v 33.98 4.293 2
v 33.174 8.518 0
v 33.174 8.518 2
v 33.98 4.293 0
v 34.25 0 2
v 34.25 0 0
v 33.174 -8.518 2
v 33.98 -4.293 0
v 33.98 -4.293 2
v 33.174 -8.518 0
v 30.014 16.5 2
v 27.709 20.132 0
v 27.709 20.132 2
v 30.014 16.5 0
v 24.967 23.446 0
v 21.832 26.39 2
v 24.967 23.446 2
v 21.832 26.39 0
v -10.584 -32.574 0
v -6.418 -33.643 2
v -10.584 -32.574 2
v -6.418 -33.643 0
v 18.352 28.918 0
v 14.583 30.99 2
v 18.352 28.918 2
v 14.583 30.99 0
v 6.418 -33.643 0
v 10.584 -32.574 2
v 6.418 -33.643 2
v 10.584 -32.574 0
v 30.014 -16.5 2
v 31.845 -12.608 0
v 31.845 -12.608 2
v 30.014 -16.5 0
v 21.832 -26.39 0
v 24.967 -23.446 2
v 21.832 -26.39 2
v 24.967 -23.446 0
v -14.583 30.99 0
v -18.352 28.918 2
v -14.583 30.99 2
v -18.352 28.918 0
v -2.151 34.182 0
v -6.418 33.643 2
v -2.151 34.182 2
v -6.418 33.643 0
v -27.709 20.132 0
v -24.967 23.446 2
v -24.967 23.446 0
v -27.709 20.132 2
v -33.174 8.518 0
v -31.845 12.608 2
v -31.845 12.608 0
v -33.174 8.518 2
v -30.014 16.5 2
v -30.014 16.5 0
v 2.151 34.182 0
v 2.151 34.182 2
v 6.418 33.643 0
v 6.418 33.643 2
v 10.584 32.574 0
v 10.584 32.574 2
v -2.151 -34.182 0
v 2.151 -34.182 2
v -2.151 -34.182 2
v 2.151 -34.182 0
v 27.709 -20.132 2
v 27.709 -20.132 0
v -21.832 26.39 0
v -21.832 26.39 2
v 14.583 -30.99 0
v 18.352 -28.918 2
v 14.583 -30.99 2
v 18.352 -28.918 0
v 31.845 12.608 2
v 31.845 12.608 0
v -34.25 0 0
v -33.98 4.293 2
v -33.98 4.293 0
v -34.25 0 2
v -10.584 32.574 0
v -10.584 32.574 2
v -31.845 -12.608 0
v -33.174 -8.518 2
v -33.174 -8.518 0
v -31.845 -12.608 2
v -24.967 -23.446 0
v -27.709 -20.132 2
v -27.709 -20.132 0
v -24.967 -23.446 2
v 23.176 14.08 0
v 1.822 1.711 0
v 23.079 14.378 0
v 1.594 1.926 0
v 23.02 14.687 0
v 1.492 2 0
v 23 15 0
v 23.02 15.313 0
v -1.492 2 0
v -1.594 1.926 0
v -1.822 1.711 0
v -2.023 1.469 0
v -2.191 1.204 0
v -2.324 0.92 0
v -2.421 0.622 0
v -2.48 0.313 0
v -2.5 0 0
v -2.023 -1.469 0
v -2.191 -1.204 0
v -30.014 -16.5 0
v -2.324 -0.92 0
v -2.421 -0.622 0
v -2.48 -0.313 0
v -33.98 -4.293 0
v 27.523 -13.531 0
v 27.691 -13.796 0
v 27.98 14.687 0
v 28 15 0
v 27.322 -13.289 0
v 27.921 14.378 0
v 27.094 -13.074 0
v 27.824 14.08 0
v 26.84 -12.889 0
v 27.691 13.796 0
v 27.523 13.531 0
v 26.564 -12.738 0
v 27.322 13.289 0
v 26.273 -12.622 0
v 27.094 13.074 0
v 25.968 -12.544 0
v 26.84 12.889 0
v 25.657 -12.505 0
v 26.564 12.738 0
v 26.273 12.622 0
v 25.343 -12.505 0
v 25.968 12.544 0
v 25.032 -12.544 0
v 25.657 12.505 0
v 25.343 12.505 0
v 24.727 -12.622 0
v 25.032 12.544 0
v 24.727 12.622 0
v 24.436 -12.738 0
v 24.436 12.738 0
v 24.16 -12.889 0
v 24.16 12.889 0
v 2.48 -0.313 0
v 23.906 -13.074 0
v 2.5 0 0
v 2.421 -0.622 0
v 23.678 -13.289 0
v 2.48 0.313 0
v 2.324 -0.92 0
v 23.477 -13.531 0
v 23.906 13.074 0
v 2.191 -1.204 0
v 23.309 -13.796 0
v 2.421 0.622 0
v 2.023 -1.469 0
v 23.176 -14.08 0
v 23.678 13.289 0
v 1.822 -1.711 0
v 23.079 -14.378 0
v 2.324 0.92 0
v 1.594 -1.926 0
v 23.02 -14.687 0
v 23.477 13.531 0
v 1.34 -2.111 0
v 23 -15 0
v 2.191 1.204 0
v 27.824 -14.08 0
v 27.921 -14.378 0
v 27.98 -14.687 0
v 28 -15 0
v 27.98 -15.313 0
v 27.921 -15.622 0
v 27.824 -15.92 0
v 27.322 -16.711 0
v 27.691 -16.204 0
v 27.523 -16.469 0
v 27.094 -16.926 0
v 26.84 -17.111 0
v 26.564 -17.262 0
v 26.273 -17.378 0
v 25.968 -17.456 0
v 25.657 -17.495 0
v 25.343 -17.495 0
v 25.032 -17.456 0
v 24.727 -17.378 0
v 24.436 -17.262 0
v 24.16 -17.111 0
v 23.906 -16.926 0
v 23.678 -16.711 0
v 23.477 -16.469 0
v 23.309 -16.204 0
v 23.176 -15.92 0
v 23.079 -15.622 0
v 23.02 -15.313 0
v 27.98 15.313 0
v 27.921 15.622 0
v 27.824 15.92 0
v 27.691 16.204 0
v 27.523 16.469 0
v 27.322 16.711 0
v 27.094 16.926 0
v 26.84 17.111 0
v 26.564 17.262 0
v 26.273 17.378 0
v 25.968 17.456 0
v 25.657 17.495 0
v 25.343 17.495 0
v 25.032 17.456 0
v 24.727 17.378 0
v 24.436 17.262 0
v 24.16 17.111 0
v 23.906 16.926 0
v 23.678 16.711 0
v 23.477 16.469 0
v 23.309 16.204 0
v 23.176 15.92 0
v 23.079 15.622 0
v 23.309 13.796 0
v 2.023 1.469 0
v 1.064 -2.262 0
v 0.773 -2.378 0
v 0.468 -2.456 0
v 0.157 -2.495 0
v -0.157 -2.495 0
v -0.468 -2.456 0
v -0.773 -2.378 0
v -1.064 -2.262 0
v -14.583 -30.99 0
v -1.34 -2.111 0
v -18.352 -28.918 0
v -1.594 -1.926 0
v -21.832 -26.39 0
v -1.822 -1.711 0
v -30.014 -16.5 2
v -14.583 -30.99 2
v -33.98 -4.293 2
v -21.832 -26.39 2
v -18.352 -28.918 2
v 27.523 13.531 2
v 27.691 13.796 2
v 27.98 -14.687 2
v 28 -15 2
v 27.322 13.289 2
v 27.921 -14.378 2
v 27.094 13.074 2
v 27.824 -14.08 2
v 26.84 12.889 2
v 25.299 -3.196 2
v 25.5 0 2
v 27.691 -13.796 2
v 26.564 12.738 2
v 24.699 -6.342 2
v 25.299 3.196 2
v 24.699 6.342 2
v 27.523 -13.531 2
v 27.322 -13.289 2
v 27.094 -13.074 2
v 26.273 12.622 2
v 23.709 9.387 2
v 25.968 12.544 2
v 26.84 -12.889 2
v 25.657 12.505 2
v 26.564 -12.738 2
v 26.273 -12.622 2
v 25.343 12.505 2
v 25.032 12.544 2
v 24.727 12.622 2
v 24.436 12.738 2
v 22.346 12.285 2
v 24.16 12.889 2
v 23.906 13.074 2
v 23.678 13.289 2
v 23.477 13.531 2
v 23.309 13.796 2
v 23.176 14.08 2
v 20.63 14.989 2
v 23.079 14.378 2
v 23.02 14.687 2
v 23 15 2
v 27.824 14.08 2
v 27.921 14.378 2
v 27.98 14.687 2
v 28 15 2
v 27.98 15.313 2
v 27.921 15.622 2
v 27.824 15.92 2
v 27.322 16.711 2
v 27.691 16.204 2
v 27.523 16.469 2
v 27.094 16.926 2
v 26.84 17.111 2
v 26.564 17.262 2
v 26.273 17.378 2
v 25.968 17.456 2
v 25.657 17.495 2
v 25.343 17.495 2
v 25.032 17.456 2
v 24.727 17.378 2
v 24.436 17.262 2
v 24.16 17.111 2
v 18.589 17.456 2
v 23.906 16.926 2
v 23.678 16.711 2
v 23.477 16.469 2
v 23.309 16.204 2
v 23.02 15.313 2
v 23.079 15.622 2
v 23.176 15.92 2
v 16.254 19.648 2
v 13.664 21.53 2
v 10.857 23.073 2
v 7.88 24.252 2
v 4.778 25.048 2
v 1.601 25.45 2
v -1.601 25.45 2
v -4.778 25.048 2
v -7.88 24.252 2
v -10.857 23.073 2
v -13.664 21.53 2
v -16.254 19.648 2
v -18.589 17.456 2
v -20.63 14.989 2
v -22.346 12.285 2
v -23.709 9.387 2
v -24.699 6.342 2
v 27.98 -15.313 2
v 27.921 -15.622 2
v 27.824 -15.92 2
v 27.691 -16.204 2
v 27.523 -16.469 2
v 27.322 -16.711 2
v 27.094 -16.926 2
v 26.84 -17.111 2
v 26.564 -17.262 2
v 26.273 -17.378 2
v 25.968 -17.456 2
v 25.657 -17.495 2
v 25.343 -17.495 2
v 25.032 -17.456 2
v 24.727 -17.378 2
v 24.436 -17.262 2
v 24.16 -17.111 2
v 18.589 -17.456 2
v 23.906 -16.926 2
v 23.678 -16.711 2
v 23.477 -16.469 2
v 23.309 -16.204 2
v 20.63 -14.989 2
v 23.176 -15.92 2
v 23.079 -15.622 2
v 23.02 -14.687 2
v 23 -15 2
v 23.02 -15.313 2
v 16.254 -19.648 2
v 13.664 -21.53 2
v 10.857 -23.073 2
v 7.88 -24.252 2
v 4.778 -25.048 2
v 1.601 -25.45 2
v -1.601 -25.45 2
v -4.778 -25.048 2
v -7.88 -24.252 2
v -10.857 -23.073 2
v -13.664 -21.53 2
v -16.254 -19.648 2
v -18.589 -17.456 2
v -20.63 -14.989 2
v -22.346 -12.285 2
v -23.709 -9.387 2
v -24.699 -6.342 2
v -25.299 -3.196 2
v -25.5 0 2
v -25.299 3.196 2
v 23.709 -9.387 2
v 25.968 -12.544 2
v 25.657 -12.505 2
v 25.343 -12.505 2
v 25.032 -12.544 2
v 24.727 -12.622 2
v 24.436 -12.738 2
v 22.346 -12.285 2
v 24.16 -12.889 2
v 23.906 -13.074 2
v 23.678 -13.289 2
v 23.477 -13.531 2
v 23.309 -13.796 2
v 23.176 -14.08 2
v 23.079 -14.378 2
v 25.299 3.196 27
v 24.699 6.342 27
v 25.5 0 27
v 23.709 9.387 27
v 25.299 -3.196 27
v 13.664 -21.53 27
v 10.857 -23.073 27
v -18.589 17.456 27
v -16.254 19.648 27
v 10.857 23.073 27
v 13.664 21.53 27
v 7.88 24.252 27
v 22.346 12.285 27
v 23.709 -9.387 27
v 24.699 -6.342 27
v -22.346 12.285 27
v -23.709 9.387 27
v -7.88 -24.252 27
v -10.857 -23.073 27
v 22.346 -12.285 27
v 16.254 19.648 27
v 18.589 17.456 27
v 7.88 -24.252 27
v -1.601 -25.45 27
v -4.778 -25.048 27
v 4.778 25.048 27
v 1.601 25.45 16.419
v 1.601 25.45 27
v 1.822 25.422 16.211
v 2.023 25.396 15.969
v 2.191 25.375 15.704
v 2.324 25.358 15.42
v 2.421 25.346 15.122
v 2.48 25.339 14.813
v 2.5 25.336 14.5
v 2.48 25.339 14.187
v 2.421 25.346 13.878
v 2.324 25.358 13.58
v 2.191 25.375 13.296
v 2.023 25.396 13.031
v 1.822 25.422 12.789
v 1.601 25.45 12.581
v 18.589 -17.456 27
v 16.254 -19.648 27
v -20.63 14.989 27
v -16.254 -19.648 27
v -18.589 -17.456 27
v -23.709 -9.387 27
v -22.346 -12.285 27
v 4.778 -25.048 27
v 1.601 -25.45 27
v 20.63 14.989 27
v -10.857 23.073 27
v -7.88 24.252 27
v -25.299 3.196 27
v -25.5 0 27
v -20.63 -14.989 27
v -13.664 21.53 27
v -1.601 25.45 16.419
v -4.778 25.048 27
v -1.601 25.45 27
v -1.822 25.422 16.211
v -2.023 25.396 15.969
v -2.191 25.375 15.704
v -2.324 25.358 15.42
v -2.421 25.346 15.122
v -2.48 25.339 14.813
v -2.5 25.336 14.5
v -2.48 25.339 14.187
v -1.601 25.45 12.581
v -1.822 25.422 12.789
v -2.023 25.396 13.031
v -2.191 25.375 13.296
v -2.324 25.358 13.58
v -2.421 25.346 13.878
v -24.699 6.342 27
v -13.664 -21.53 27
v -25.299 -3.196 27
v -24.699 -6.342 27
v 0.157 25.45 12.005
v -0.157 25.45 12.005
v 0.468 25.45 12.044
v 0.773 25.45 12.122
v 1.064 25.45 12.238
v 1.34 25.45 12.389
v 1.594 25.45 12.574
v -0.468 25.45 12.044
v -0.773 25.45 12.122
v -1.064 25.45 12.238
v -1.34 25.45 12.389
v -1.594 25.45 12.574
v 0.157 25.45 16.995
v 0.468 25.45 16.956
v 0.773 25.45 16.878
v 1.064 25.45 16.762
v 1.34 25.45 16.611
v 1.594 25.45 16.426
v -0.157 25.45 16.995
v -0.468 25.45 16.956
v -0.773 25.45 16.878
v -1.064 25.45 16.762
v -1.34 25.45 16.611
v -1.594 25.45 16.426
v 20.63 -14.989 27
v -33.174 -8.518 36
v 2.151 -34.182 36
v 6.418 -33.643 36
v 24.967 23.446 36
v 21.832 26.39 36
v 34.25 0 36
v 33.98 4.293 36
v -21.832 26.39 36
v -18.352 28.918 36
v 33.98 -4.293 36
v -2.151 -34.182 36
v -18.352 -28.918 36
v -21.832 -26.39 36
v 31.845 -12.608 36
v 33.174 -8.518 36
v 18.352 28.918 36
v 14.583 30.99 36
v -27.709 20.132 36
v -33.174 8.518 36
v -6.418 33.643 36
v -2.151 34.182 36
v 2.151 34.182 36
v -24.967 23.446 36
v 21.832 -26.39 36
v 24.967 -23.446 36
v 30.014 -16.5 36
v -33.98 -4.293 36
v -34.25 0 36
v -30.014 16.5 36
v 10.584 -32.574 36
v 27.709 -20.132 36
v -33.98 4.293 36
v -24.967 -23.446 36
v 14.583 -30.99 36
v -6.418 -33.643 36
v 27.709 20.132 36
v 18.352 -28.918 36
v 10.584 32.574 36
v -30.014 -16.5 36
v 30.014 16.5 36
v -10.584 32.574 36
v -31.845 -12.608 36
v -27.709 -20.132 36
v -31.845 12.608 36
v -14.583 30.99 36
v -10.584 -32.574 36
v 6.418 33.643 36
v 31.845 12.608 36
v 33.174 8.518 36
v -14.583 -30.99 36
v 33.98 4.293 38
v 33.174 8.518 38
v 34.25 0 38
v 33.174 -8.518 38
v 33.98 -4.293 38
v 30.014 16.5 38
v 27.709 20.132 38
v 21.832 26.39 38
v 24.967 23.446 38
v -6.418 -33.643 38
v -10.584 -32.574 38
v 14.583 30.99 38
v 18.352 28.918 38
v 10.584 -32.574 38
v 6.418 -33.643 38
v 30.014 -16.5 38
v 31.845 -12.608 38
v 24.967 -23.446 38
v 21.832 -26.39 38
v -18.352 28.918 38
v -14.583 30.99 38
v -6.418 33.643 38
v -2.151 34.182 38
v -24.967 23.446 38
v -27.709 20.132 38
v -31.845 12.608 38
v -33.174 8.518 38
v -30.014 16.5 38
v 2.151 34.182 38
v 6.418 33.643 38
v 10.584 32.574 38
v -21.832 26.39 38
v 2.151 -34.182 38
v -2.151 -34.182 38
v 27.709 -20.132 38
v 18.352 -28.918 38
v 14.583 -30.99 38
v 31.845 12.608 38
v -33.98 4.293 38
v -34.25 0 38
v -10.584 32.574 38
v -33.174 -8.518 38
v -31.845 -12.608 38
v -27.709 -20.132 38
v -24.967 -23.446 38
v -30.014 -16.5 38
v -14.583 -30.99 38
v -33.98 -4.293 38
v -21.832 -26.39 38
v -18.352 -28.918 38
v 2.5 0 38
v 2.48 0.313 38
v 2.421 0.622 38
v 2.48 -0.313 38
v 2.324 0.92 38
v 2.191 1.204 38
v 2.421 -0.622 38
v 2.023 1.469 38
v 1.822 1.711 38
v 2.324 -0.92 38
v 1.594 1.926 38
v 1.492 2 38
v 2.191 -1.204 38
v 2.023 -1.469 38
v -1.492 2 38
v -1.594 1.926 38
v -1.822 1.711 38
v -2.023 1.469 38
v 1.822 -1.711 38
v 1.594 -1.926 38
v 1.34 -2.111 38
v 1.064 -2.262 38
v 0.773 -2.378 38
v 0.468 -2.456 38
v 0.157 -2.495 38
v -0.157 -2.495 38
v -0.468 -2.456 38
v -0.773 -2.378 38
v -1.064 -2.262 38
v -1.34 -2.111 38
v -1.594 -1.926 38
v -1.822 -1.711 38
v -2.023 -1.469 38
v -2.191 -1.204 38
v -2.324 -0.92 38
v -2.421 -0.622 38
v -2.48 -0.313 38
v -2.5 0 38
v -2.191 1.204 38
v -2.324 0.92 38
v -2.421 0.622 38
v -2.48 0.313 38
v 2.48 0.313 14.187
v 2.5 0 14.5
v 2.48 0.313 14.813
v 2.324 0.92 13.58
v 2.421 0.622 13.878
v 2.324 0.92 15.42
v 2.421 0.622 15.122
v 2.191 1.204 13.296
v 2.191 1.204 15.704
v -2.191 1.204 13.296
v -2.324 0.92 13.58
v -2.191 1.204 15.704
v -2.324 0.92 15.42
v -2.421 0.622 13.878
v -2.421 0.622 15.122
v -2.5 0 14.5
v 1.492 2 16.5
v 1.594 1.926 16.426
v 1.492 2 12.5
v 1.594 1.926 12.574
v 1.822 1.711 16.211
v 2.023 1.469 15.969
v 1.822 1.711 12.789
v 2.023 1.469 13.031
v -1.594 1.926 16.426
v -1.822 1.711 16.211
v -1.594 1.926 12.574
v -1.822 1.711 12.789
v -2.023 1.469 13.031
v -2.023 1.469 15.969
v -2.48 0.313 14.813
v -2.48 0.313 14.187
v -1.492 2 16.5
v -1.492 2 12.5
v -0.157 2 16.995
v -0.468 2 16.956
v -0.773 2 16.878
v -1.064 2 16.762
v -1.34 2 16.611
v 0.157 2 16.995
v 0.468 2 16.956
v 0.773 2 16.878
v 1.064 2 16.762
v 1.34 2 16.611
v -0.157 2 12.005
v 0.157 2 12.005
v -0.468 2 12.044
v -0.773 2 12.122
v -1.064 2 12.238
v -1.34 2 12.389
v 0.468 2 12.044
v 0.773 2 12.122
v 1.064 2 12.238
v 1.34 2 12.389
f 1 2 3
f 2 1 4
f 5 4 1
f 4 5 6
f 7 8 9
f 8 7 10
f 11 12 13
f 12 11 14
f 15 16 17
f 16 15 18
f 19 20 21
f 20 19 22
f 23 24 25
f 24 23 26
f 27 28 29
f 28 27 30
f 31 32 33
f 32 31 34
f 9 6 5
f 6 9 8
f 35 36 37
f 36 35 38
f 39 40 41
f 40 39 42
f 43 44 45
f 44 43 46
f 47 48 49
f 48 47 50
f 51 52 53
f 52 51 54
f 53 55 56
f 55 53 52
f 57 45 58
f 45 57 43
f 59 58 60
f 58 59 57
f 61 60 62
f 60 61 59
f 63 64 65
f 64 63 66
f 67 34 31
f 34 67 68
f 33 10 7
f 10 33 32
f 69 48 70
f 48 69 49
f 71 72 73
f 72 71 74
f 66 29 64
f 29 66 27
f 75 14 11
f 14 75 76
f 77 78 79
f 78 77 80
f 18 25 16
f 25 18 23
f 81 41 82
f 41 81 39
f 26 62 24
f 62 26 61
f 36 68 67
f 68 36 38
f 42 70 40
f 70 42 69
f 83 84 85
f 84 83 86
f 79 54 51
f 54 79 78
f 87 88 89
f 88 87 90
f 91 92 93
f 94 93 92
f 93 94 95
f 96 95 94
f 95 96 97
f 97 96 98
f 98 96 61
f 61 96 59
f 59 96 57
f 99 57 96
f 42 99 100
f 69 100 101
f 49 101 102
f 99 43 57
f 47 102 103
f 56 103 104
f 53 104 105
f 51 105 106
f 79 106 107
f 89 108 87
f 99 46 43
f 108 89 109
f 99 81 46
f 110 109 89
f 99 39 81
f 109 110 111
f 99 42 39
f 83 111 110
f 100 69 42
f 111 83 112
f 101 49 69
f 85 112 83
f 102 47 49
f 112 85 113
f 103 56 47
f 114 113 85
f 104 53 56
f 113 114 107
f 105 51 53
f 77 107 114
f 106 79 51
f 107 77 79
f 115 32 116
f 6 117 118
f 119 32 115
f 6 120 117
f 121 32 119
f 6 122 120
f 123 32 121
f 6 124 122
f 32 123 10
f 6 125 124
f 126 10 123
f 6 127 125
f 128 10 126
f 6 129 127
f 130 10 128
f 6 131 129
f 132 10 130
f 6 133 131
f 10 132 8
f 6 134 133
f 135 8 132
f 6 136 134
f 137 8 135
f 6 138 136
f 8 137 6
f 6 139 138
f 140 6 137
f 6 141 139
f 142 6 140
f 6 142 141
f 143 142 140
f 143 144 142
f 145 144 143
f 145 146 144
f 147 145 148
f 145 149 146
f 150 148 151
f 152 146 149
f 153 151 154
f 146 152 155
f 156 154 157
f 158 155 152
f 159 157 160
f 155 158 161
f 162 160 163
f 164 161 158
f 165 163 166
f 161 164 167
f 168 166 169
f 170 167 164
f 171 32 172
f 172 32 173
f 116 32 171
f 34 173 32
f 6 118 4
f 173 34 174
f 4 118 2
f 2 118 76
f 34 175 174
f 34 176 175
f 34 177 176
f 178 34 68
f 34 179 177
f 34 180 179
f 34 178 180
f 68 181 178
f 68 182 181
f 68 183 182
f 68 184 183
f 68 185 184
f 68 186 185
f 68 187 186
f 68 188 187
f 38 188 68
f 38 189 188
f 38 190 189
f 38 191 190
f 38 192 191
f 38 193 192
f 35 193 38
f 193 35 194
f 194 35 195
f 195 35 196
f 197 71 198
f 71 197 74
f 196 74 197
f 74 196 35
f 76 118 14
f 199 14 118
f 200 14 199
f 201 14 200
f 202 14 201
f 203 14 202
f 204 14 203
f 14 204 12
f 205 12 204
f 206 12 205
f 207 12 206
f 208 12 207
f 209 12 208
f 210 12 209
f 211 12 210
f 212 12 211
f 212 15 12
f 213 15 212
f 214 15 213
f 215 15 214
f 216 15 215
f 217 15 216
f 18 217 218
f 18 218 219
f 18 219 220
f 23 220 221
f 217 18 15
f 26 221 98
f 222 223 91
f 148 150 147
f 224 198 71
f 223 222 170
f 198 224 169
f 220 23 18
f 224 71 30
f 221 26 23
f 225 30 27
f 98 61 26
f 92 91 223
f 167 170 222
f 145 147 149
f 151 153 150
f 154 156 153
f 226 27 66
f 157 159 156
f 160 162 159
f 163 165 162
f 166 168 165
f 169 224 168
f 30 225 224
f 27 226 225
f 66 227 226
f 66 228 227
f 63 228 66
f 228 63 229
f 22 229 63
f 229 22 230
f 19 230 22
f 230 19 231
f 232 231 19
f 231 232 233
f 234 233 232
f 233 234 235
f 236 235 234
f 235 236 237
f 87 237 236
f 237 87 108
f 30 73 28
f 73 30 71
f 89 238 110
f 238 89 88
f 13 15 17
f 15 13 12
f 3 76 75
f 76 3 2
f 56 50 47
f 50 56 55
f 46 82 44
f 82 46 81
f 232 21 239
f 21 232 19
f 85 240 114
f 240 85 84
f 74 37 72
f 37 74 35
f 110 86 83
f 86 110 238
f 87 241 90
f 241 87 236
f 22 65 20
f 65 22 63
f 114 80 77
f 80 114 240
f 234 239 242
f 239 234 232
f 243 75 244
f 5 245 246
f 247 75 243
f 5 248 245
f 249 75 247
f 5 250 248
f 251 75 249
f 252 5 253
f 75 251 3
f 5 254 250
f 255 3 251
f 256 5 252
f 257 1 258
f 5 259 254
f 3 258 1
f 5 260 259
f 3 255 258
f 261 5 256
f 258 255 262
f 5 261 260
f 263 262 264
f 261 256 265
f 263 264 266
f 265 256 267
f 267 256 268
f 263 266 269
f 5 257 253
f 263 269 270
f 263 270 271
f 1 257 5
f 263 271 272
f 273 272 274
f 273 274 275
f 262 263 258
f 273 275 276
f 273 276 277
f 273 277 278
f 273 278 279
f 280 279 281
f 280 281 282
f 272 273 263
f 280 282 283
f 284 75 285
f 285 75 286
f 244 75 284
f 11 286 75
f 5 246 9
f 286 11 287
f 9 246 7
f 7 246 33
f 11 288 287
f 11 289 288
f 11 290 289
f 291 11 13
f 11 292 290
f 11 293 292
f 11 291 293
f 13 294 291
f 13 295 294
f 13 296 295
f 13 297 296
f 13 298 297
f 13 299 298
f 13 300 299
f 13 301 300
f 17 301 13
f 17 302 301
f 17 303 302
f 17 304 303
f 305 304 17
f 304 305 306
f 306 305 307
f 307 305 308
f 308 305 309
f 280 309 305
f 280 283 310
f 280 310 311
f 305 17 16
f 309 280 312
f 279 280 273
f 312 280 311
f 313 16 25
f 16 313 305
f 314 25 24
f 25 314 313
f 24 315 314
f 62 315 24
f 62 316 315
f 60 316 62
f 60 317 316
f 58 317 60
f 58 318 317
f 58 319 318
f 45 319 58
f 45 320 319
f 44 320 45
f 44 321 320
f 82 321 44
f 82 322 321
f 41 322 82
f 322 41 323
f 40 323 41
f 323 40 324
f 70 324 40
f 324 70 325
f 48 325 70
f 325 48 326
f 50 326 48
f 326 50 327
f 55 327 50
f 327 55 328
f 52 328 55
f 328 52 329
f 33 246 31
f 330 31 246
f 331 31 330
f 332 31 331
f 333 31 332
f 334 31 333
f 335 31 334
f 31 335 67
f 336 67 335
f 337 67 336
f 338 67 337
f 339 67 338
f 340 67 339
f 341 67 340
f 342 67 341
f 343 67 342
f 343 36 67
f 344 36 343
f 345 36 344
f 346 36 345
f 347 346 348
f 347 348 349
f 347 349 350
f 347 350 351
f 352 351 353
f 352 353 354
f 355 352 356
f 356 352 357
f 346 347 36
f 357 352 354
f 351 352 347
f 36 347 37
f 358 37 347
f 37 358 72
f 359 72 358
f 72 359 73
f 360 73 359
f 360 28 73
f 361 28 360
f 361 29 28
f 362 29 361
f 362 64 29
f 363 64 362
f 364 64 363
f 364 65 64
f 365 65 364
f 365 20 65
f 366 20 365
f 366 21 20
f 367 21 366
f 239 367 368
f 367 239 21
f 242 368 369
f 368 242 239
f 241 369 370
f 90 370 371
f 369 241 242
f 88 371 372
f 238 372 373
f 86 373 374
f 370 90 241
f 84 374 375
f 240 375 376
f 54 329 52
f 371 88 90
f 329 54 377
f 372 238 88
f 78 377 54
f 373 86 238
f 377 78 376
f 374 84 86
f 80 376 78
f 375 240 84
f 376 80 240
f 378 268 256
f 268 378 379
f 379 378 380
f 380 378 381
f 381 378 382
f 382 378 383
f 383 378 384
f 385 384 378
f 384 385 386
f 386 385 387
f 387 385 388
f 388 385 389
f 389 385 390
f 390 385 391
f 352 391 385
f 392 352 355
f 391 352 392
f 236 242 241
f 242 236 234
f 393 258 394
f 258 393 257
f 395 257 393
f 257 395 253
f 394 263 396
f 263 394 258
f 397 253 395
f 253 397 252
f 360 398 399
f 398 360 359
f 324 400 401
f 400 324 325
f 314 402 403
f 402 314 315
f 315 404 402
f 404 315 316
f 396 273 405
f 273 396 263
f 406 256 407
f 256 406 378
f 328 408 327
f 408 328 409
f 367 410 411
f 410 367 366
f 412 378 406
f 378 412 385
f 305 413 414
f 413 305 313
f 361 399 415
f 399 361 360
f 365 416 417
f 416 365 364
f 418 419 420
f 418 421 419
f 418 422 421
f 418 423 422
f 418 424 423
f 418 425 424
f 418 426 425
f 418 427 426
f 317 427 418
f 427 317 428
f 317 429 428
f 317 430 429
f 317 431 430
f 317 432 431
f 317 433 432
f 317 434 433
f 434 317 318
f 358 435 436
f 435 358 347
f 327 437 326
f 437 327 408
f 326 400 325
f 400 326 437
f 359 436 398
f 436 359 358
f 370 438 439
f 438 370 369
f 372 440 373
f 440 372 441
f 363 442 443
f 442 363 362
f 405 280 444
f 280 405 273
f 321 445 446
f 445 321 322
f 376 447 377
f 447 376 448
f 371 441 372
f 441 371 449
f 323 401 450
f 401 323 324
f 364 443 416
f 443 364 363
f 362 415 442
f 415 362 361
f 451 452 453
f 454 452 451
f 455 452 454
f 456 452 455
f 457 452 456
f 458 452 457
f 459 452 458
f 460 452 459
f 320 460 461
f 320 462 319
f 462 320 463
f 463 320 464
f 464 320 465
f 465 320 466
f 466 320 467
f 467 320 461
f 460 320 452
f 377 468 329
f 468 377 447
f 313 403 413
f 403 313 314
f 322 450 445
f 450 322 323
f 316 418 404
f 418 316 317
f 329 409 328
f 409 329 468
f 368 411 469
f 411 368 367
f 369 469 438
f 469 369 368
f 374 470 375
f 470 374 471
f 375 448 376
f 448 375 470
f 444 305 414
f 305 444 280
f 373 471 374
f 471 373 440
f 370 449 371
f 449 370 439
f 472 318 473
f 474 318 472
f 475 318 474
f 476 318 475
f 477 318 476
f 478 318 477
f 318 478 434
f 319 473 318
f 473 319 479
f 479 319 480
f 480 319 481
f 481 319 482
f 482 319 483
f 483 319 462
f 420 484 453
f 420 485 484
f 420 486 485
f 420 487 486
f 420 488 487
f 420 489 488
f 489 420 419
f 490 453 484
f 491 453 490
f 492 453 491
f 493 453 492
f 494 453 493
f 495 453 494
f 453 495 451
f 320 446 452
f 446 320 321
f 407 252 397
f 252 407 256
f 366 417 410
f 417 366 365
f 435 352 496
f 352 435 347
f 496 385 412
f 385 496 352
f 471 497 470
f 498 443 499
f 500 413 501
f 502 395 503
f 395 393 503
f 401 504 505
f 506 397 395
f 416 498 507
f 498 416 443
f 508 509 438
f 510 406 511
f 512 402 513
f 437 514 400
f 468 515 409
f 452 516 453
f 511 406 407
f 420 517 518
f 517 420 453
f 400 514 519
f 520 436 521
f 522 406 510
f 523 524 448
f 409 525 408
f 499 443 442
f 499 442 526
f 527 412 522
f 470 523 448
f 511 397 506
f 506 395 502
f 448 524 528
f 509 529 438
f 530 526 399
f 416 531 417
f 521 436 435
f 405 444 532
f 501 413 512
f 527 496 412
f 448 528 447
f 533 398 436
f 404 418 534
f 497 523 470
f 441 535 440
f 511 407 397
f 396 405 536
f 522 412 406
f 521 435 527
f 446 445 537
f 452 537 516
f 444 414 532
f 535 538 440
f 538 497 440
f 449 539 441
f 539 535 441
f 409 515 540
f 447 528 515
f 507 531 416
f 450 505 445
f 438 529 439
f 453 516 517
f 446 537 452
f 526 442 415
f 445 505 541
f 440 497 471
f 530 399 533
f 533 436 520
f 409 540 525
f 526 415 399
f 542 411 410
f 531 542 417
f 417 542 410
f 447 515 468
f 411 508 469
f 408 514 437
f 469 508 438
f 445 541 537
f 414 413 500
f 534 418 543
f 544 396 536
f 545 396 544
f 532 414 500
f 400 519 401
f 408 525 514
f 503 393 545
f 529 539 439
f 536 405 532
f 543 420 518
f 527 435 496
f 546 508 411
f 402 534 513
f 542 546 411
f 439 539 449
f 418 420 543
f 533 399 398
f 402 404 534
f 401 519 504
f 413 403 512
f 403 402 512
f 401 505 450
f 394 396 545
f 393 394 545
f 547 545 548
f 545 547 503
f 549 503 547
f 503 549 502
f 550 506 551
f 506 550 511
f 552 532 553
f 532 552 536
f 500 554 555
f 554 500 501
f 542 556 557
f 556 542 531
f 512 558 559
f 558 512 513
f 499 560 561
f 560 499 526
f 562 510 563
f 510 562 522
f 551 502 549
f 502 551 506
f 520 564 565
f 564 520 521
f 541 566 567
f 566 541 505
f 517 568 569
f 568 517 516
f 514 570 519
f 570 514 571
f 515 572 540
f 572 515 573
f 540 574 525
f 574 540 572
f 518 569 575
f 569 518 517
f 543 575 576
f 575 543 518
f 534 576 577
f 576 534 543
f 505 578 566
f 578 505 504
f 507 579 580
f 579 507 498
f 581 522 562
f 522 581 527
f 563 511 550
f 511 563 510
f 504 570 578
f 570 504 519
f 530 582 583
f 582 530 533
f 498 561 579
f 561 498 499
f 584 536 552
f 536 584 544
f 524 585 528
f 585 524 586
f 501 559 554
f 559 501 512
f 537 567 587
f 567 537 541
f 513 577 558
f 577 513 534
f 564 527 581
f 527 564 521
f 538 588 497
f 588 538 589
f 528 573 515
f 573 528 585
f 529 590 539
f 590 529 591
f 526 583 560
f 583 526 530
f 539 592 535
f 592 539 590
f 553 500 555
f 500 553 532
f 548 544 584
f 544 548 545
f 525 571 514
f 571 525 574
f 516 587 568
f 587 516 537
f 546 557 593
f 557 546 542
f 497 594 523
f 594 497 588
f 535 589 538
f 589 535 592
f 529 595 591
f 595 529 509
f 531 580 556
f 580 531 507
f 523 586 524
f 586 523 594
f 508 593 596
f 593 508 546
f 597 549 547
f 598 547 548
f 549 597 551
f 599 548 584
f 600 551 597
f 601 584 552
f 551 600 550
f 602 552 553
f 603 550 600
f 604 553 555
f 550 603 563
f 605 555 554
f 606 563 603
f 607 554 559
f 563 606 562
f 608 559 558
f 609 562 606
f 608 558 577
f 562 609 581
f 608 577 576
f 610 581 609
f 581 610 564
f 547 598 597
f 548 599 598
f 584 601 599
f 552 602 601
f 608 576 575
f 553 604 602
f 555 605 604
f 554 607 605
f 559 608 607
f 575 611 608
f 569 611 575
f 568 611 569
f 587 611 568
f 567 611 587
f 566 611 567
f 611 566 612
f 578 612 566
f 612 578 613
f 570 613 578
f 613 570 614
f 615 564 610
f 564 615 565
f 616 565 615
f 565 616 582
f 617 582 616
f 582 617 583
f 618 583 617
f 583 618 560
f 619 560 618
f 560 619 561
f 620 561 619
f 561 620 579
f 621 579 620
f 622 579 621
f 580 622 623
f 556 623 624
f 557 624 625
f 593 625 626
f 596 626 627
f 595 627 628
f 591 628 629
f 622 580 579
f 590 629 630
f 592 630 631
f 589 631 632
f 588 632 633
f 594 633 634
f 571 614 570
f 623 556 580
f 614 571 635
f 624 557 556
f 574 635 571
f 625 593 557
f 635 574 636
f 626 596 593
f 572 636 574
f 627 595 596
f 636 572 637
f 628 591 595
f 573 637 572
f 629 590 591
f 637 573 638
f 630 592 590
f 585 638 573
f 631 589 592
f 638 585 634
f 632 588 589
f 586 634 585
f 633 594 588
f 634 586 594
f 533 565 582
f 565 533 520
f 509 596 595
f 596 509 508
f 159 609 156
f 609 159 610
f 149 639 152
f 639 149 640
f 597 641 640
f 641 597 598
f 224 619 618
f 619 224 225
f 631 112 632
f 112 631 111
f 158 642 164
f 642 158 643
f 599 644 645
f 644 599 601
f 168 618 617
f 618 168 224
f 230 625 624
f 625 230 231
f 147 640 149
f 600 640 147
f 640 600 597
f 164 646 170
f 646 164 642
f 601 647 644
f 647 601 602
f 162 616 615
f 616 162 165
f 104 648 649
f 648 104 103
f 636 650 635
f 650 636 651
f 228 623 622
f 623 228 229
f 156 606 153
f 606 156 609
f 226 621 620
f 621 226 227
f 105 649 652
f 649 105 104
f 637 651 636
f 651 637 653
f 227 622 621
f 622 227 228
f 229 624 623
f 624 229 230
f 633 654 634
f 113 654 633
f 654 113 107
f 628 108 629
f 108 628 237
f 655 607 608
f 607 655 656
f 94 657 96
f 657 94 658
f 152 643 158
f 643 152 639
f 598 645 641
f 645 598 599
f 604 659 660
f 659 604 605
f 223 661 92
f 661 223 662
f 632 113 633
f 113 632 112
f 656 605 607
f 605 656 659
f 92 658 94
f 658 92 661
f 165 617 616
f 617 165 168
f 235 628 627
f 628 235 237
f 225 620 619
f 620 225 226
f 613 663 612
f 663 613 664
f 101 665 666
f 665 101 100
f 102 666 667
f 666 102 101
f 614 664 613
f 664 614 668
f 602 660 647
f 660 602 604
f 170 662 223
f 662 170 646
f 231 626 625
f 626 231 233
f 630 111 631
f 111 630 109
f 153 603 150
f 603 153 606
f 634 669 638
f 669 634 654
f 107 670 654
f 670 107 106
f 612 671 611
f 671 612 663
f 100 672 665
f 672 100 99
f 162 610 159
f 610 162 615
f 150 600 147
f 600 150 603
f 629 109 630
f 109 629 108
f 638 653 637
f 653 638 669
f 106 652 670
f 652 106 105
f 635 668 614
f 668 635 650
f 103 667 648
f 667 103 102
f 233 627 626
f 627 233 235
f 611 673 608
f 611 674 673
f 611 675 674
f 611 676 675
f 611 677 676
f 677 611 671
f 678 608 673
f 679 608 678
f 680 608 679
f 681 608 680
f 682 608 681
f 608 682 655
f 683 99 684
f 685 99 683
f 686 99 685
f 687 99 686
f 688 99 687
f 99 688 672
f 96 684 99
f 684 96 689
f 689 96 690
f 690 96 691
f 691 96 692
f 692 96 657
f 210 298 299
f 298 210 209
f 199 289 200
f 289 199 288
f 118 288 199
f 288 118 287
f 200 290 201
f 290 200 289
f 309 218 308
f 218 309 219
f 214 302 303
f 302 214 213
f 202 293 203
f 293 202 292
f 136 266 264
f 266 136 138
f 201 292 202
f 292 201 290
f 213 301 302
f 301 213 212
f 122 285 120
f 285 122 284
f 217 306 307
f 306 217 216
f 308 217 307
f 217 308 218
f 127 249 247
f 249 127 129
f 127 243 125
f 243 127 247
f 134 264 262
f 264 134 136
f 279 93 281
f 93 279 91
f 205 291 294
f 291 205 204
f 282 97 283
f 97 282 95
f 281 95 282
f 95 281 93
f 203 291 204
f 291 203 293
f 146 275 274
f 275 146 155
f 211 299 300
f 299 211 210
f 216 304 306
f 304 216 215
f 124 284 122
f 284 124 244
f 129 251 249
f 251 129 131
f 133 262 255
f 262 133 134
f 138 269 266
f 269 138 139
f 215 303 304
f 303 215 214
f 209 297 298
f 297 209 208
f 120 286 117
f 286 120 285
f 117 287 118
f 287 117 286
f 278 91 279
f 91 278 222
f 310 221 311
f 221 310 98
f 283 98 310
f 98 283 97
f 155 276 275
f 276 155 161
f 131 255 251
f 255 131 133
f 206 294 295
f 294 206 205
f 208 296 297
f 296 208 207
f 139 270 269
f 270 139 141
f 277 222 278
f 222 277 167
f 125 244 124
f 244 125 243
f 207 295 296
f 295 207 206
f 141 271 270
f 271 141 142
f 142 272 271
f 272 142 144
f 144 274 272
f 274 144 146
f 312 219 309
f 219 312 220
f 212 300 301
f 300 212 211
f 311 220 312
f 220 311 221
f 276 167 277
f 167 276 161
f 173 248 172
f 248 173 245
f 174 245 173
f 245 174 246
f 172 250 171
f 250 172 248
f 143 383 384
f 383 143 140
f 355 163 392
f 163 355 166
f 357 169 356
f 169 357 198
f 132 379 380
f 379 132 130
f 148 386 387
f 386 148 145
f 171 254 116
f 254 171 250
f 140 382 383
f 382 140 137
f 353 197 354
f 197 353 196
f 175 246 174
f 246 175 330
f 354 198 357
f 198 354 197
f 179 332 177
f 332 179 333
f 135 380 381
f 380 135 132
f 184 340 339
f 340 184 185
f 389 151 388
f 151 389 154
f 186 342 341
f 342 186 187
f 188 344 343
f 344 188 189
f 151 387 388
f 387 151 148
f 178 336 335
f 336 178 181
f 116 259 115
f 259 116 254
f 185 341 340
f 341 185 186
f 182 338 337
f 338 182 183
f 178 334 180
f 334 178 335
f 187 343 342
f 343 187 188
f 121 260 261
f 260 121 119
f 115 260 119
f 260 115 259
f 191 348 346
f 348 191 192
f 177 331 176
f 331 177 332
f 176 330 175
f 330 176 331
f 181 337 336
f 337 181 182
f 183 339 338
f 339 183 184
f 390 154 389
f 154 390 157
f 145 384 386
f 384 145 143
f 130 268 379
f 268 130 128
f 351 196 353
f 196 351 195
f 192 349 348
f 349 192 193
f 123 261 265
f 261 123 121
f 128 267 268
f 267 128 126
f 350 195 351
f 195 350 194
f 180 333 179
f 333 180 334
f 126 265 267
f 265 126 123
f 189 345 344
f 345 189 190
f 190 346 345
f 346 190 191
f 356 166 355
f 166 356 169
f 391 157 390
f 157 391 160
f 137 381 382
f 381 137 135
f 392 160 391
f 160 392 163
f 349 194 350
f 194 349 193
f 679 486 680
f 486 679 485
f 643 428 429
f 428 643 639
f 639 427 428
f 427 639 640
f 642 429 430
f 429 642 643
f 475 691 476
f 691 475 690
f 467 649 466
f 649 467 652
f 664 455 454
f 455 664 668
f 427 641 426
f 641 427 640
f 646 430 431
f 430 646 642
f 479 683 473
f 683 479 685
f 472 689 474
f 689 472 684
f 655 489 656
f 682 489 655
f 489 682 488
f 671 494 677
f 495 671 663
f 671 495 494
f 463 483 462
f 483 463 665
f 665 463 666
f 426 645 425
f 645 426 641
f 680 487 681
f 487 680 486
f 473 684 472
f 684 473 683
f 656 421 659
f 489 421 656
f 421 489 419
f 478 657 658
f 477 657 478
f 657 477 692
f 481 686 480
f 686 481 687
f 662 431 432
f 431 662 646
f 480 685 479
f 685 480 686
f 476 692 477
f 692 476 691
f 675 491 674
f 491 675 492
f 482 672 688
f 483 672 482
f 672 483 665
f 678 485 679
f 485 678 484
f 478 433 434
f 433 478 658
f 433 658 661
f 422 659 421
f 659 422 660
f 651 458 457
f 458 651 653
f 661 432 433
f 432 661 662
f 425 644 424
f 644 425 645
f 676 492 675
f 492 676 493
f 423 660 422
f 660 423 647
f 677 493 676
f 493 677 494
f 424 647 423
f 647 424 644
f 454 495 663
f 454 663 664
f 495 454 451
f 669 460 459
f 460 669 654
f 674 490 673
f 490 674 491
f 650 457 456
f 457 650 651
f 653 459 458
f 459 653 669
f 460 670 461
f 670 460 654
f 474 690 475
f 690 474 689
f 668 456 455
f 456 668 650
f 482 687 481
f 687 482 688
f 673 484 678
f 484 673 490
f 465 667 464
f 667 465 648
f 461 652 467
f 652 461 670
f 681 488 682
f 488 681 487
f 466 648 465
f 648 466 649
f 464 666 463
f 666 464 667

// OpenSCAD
//resolution:
$fn=50;


//Input
L = 800; // rope length [mm]
n = 5; // number of winding
ropeD = 5; //rope diameter with safety [mm]
h = 2; // base rings width

wormD = 5; //worm screw hole diameter [mm]

holeD = 5; //hole diameter [mm]



//CAD

//math
D = round(L/(n*PI)); //diameter of drum
echo("D is:" , D);


v = n* ropeD; //width of drum

hD = D + 3.5*ropeD; //outerrim DIA
coneHeight = 1.8*ropeD;


 


//model
difference()
{
drum(h, hD, v, coneHeight);
    //shaft hole
    hole(2*h+coneHeight+v, holeD);
    
    
    //rope holes
    translate([hD/2-(hD-D)/2, 3*ropeD,0]) cylinder(10,d=ropeD,true);
    
    translate([hD/2-(hD-D)/2, -3*ropeD,0]) cylinder(10,d=ropeD,true);
    
    
    //wormhole
    translate([0,0,v/2+h])
rotate(a= -90,v=[1,0,0]) cylinder(D/2, d=wormD);
    
}
//drum
module drum(h, hD, v, coneHeight)
{
cylinder(h, d=hD);

translate([0,0,h]) cylinder(v, d=D);

translate([0,0,h+v]) cylinder(coneHeight, d1 = D,d2=hD);
//cone is there only to make it easier for FDM printer

translate([0,0,h+v+coneHeight]) cylinder(h, d=hD);
}



module hole(holeHeight, holeD)
{
    difference()
    {
cylinder(holeHeight, d = holeD);
translate([-holeD/2,2/5*holeD,0]) cube([holeD,holeD,holeHeight]);
    }
}
